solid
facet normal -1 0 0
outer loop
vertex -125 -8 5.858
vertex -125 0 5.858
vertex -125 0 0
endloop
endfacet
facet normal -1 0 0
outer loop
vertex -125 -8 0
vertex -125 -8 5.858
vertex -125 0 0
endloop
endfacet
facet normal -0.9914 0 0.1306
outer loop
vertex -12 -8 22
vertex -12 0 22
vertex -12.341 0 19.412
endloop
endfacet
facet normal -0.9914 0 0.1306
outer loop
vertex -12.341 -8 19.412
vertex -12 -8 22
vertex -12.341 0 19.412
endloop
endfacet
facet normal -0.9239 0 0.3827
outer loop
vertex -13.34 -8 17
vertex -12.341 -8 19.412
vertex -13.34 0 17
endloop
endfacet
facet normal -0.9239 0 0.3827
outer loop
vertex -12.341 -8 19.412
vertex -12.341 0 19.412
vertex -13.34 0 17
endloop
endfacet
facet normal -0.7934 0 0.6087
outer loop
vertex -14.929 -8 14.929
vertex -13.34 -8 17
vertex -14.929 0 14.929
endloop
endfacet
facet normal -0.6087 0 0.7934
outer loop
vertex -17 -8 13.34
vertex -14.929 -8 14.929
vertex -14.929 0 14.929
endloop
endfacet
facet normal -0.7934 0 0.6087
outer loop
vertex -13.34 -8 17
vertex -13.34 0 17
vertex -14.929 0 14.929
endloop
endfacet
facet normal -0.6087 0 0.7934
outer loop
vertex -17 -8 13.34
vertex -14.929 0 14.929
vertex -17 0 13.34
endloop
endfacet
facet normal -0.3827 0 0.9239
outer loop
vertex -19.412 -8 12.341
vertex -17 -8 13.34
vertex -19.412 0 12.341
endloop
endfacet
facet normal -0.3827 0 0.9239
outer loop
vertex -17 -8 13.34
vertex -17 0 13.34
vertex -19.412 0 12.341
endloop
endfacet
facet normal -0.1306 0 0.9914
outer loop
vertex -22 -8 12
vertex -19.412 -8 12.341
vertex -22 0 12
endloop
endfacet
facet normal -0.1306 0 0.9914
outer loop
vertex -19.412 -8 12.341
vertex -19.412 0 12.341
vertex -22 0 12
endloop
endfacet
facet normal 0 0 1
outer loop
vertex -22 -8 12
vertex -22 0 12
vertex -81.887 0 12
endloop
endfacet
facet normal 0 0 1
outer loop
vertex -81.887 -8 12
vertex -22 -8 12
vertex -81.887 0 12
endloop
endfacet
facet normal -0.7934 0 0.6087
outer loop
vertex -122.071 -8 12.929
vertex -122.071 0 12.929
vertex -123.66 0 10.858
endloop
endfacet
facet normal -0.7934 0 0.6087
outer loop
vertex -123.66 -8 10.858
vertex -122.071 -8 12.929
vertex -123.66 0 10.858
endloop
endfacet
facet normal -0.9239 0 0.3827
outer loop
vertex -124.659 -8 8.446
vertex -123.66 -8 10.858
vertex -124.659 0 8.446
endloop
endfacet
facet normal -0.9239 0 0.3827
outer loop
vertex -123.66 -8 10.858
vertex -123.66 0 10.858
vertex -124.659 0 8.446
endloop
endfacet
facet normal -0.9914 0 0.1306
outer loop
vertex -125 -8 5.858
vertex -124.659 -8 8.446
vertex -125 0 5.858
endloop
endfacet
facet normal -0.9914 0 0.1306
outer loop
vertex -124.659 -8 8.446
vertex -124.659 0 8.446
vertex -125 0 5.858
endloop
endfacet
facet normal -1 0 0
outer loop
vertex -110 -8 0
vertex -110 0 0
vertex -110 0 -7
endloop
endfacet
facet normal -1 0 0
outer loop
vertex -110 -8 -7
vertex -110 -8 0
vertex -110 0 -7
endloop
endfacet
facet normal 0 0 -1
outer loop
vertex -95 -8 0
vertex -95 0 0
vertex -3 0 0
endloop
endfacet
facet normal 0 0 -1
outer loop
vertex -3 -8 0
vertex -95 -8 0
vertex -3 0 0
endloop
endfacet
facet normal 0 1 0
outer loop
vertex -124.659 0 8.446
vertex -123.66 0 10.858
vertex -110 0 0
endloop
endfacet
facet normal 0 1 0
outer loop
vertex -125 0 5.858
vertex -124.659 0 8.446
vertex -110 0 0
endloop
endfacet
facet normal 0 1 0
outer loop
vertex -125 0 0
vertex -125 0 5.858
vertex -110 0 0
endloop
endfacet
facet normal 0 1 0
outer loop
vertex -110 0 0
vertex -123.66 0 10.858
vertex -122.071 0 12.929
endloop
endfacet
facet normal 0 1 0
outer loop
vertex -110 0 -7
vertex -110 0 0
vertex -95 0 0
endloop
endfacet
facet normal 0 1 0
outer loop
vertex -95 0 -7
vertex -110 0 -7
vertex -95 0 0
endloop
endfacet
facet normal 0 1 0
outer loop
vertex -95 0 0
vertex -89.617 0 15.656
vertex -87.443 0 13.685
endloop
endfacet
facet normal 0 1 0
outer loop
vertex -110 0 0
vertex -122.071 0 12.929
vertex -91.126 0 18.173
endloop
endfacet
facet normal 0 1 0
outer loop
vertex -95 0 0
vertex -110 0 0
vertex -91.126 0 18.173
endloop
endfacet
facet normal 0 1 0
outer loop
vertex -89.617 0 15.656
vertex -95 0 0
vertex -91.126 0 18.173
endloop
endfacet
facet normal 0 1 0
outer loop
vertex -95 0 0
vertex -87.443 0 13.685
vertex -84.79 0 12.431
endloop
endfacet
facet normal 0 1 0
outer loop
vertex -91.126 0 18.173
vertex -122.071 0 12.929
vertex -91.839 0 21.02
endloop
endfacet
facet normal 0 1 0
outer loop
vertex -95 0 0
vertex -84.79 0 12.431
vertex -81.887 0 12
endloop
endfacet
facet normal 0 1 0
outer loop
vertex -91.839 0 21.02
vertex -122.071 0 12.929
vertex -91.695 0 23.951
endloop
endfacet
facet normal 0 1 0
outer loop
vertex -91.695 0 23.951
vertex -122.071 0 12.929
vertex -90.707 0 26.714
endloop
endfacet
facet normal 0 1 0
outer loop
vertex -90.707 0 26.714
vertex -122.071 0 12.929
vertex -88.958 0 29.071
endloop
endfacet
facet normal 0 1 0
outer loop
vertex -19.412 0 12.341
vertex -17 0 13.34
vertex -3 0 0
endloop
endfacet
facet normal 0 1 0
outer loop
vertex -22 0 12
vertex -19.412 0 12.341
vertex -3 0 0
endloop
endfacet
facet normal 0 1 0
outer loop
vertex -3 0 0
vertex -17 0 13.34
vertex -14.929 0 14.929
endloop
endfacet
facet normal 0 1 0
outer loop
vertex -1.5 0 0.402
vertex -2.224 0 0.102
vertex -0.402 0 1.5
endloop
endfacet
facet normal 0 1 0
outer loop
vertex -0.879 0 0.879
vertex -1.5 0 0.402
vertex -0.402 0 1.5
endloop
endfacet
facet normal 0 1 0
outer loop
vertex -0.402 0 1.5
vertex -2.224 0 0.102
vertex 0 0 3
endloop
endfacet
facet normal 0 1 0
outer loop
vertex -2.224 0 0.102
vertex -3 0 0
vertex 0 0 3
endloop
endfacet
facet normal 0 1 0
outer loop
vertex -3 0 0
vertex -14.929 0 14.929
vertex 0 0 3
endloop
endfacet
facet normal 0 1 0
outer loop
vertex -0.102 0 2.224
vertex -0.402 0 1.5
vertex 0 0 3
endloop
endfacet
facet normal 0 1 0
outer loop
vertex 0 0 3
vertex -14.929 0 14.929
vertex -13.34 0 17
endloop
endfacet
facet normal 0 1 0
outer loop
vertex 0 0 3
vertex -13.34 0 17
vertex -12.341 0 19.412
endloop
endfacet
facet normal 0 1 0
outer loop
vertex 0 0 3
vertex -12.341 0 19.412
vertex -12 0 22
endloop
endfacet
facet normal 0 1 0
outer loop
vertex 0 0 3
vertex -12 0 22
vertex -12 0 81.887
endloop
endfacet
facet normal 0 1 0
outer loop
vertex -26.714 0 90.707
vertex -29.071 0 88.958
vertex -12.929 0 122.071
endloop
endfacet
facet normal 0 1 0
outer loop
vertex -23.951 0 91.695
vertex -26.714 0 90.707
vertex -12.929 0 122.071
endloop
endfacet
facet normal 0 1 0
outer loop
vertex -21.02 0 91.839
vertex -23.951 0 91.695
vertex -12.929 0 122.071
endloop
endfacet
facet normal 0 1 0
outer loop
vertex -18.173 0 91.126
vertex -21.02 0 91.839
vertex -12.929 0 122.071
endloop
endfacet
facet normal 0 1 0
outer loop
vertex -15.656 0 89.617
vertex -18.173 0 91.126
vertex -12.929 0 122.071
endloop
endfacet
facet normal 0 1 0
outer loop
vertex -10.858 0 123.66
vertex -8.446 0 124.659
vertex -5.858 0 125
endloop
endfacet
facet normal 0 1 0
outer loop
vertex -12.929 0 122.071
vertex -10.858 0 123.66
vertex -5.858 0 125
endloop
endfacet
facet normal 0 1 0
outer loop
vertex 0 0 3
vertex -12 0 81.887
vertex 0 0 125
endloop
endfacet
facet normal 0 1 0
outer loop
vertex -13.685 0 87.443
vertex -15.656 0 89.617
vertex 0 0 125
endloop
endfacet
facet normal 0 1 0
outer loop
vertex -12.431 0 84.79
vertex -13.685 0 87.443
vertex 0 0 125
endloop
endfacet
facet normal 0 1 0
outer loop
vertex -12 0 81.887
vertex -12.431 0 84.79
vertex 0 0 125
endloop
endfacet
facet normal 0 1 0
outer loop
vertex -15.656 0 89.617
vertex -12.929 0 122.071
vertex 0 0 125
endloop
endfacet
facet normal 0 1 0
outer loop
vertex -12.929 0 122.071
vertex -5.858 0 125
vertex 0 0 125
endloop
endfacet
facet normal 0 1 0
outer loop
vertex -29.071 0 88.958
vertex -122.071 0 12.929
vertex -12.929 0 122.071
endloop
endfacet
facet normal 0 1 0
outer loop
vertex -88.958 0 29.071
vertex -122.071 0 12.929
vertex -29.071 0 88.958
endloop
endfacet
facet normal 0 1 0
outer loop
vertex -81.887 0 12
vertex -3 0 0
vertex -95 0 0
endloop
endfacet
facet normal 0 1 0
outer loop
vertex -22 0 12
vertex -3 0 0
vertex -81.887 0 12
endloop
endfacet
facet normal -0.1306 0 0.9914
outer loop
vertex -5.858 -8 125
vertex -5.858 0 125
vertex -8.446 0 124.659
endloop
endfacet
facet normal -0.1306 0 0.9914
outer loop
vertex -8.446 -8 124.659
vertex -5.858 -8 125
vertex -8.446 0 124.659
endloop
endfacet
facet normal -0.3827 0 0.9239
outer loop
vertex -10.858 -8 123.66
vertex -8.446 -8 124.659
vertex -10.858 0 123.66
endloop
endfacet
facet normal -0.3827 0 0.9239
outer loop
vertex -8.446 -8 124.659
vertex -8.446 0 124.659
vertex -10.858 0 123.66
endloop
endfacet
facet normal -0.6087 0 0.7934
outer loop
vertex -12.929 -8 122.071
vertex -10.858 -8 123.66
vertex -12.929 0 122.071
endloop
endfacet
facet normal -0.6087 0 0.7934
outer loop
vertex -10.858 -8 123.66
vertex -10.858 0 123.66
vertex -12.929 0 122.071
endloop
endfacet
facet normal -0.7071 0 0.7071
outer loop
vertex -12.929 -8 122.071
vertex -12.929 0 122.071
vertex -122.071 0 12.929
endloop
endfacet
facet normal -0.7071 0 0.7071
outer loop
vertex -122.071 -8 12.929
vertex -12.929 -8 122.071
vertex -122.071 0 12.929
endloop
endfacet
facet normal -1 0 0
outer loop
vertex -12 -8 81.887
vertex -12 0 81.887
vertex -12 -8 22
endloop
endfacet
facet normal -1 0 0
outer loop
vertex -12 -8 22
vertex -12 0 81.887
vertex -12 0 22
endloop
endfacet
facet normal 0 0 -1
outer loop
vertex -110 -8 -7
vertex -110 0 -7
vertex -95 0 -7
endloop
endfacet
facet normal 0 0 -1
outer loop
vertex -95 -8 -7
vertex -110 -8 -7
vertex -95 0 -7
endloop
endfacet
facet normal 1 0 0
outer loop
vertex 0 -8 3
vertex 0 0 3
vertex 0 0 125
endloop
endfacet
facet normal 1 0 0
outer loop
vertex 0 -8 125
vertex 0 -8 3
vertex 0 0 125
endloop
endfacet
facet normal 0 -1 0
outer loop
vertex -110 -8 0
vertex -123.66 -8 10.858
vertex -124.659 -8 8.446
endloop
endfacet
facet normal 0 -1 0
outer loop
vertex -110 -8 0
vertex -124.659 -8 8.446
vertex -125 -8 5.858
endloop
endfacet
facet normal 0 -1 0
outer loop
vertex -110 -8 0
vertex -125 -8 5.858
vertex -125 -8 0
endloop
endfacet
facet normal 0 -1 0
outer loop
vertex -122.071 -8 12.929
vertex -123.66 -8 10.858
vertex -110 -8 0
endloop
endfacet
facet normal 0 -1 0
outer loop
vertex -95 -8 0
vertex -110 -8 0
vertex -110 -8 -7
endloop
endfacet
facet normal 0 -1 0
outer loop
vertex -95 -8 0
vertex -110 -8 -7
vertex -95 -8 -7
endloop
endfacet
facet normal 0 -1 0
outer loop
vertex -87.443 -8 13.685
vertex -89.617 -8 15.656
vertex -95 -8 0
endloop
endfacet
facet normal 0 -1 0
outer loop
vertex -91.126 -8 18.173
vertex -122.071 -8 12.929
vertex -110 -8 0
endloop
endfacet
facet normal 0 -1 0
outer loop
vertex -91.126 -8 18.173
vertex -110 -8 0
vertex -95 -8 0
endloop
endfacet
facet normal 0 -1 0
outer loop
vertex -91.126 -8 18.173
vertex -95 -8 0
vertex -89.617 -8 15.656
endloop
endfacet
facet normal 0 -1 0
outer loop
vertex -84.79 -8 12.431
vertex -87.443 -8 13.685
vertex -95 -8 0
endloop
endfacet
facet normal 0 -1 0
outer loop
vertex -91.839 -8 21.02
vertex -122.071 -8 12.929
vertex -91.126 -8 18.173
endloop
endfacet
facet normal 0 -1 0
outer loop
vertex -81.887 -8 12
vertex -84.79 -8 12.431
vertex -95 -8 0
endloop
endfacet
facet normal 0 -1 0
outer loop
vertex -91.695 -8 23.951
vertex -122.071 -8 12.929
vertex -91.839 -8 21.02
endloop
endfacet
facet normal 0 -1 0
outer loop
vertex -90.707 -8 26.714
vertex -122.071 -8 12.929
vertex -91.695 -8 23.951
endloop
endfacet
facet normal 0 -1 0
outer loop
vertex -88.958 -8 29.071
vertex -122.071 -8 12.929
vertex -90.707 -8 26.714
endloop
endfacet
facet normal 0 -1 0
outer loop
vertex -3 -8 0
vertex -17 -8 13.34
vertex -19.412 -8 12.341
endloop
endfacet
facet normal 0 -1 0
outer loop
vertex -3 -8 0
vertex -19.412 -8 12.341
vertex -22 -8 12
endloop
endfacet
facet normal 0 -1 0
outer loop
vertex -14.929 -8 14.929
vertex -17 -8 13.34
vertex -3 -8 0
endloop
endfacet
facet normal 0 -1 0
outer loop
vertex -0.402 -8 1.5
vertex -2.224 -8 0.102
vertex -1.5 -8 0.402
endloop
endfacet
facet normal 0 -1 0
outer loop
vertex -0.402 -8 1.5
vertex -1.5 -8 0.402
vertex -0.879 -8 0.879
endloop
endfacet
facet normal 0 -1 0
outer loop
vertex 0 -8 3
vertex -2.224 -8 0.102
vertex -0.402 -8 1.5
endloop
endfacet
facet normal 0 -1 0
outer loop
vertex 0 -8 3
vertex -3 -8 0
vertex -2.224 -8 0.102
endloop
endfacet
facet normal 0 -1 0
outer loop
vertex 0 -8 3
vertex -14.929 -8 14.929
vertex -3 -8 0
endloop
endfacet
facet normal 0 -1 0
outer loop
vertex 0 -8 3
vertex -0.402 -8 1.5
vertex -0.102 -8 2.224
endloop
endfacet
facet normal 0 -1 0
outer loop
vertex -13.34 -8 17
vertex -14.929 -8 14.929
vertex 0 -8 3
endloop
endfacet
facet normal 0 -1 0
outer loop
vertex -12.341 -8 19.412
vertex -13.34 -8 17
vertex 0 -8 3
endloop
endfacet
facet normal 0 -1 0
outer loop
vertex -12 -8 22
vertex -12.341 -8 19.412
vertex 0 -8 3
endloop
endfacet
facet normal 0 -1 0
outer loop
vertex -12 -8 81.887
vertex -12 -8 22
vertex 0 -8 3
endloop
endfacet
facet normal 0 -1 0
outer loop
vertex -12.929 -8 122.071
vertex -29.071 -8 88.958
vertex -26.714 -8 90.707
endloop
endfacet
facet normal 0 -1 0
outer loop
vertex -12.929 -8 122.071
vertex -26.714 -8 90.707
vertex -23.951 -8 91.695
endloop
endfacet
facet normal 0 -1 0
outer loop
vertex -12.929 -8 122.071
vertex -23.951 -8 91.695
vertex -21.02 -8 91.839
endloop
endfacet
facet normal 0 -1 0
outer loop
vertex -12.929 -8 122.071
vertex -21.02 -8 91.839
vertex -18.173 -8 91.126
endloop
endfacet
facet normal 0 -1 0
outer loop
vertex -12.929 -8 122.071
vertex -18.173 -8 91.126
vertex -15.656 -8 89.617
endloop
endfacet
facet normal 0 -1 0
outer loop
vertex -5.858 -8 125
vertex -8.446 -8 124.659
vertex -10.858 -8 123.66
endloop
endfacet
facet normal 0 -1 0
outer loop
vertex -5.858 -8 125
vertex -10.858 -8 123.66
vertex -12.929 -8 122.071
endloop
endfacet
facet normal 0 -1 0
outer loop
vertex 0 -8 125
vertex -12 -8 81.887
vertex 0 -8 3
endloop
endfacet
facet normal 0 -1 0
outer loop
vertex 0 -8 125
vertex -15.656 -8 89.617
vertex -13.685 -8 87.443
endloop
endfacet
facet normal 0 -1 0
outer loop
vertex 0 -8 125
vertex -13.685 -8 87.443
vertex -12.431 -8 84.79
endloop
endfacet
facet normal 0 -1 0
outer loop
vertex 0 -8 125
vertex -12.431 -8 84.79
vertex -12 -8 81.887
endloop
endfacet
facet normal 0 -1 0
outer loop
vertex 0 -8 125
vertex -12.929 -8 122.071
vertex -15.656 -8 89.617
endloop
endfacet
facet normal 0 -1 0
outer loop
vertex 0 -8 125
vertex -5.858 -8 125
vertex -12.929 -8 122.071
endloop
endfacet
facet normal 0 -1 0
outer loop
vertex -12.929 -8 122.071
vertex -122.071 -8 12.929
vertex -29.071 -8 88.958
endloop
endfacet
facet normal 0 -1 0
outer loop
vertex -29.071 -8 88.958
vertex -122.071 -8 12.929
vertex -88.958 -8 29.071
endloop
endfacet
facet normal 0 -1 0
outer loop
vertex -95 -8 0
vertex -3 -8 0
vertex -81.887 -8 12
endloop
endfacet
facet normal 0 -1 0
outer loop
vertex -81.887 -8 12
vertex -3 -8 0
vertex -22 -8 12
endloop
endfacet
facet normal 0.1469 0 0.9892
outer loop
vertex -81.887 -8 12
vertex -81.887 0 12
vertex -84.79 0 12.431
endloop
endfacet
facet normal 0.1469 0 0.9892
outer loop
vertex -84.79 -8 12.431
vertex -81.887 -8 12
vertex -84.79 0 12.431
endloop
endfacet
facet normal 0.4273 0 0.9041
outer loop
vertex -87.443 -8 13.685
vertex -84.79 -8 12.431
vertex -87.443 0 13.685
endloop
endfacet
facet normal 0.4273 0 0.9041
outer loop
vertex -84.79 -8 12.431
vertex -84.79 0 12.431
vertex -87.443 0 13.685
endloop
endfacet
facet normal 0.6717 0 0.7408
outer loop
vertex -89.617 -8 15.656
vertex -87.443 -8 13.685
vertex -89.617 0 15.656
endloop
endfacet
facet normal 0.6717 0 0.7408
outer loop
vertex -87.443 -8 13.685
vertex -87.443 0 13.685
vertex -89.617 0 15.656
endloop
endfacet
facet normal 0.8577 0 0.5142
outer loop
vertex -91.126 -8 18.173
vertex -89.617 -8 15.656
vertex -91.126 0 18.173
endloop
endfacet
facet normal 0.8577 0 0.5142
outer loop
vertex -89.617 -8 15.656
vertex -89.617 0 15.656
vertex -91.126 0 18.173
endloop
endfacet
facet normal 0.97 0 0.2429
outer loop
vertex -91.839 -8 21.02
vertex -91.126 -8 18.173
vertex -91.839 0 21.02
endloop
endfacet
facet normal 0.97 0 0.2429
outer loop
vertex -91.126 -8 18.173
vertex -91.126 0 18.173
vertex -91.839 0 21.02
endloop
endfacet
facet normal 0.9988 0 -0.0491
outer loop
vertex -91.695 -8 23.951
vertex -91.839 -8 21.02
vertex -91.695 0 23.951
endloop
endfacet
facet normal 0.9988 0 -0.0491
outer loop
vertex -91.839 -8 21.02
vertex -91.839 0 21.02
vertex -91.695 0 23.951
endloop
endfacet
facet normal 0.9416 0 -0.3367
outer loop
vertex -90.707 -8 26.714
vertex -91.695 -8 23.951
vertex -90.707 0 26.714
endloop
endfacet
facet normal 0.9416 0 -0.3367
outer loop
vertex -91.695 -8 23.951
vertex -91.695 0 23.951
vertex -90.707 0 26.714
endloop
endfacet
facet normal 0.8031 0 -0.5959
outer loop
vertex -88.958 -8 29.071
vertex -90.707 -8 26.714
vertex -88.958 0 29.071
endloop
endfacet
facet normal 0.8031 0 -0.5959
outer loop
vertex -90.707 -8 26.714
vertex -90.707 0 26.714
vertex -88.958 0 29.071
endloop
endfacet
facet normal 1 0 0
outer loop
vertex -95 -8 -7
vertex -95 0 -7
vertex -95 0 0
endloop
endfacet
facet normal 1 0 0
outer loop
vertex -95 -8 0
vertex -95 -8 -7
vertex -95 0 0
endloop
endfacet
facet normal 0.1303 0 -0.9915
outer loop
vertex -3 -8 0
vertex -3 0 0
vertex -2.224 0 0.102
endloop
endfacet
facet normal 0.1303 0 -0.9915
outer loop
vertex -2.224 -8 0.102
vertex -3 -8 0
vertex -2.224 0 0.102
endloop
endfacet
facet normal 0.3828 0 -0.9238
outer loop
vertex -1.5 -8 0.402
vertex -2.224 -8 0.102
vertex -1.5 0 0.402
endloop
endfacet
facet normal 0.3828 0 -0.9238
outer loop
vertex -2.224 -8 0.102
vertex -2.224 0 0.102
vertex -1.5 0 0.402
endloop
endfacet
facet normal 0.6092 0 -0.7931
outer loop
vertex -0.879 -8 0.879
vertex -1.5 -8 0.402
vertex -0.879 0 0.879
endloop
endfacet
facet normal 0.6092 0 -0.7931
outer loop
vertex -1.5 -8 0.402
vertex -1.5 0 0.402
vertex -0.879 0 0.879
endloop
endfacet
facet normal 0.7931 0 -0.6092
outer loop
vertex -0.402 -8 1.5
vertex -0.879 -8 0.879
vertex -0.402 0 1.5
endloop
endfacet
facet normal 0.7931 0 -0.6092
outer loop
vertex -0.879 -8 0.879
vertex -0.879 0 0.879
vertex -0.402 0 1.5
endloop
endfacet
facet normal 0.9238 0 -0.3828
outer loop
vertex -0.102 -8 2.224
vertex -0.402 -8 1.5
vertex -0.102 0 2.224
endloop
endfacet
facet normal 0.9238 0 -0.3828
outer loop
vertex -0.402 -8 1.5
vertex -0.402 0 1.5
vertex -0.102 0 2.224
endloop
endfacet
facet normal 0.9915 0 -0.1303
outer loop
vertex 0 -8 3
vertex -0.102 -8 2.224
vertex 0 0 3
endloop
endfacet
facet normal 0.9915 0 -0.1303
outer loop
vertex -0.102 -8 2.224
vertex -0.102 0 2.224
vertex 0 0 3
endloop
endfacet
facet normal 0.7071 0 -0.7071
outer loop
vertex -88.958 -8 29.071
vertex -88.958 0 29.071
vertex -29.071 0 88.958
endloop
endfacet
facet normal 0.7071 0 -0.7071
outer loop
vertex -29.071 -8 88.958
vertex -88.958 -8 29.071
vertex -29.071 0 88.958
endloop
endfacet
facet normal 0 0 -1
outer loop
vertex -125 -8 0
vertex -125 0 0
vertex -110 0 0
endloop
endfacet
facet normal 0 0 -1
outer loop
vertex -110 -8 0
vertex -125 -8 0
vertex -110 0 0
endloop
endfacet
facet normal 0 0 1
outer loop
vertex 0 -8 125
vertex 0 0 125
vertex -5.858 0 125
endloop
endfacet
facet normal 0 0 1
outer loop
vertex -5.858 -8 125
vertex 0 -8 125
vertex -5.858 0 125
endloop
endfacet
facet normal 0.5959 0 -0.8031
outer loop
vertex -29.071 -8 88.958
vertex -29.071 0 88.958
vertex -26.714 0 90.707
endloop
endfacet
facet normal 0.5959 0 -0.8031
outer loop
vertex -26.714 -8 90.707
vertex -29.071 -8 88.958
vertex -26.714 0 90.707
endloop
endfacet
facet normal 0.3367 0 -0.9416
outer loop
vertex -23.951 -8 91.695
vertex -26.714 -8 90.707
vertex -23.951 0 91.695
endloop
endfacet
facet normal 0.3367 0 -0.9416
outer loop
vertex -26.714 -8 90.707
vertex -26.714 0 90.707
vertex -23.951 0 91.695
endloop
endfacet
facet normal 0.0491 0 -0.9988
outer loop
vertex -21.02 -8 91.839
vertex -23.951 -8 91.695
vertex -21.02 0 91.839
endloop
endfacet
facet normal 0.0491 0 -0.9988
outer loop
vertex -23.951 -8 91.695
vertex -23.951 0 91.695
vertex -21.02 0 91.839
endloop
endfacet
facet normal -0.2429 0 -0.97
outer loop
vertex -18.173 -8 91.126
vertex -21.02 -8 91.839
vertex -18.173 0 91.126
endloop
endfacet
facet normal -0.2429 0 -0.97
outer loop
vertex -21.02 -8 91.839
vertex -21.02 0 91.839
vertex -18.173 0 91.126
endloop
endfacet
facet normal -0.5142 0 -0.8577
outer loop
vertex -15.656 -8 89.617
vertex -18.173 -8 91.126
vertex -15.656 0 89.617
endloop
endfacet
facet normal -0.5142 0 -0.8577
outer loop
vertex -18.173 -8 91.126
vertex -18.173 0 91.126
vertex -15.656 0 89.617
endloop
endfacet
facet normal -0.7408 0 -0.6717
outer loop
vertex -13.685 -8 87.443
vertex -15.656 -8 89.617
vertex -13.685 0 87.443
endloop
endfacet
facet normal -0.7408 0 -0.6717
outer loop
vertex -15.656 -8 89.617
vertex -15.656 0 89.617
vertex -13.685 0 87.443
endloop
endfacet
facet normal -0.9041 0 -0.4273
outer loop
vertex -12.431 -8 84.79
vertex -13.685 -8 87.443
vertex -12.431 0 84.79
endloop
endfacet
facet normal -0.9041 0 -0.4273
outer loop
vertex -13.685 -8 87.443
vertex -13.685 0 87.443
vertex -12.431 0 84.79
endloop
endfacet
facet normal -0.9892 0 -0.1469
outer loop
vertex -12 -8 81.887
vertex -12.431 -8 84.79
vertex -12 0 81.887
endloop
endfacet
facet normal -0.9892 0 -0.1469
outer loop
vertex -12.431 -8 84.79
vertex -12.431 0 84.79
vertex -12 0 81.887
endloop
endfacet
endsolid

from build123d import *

# Parameters (mm, degrees)
F1_DEPTH = 8


with BuildPart() as f1:
    # F0 (on Front) → F1 (new body)
    with BuildSketch(Plane.XZ):
        with BuildLine():
            ThreePointArc((-3, 0), (-0.87868, 0.87868), (0, 3))
            Line((0, 3), (0, 125))
            Line((0, 125), (-5.857864, 125))
            ThreePointArc((-5.857864, 125), (-9.684699, 124.238795), (-12.928932, 122.071068))
            Line((-12.928932, 122.071068), (-122.071068, 12.928932))
            ThreePointArc((-122.071068, 12.928932), (-124.238795, 9.684699), (-125, 5.857864))
            Line((-125, 5.857864), (-125, 0))
            Line((-125, 0), (-110, 0))
            Line((-110, 0), (-110, -7))
            Line((-110, -7), (-95, -7))
            Line((-95, -7), (-95, 0))
            Line((-95, 0), (-3, 0))
        make_face()
        with BuildLine():
            ThreePointArc((-29.071068, 88.958369), (-18.173166, 91.126097), (-12, 81.887302))
            Line((-12, 81.887302), (-12, 22))
            ThreePointArc((-12, 22), (-14.928932, 14.928932), (-22, 12))
            Line((-22, 12), (-81.887302, 12))
            ThreePointArc((-81.887302, 12), (-91.126097, 18.173166), (-88.958369, 29.071068))
            Line((-88.958369, 29.071068), (-29.071068, 88.958369))
        make_face(mode=Mode.SUBTRACT)
    extrude(amount=F1_DEPTH)


solid = f1.part
